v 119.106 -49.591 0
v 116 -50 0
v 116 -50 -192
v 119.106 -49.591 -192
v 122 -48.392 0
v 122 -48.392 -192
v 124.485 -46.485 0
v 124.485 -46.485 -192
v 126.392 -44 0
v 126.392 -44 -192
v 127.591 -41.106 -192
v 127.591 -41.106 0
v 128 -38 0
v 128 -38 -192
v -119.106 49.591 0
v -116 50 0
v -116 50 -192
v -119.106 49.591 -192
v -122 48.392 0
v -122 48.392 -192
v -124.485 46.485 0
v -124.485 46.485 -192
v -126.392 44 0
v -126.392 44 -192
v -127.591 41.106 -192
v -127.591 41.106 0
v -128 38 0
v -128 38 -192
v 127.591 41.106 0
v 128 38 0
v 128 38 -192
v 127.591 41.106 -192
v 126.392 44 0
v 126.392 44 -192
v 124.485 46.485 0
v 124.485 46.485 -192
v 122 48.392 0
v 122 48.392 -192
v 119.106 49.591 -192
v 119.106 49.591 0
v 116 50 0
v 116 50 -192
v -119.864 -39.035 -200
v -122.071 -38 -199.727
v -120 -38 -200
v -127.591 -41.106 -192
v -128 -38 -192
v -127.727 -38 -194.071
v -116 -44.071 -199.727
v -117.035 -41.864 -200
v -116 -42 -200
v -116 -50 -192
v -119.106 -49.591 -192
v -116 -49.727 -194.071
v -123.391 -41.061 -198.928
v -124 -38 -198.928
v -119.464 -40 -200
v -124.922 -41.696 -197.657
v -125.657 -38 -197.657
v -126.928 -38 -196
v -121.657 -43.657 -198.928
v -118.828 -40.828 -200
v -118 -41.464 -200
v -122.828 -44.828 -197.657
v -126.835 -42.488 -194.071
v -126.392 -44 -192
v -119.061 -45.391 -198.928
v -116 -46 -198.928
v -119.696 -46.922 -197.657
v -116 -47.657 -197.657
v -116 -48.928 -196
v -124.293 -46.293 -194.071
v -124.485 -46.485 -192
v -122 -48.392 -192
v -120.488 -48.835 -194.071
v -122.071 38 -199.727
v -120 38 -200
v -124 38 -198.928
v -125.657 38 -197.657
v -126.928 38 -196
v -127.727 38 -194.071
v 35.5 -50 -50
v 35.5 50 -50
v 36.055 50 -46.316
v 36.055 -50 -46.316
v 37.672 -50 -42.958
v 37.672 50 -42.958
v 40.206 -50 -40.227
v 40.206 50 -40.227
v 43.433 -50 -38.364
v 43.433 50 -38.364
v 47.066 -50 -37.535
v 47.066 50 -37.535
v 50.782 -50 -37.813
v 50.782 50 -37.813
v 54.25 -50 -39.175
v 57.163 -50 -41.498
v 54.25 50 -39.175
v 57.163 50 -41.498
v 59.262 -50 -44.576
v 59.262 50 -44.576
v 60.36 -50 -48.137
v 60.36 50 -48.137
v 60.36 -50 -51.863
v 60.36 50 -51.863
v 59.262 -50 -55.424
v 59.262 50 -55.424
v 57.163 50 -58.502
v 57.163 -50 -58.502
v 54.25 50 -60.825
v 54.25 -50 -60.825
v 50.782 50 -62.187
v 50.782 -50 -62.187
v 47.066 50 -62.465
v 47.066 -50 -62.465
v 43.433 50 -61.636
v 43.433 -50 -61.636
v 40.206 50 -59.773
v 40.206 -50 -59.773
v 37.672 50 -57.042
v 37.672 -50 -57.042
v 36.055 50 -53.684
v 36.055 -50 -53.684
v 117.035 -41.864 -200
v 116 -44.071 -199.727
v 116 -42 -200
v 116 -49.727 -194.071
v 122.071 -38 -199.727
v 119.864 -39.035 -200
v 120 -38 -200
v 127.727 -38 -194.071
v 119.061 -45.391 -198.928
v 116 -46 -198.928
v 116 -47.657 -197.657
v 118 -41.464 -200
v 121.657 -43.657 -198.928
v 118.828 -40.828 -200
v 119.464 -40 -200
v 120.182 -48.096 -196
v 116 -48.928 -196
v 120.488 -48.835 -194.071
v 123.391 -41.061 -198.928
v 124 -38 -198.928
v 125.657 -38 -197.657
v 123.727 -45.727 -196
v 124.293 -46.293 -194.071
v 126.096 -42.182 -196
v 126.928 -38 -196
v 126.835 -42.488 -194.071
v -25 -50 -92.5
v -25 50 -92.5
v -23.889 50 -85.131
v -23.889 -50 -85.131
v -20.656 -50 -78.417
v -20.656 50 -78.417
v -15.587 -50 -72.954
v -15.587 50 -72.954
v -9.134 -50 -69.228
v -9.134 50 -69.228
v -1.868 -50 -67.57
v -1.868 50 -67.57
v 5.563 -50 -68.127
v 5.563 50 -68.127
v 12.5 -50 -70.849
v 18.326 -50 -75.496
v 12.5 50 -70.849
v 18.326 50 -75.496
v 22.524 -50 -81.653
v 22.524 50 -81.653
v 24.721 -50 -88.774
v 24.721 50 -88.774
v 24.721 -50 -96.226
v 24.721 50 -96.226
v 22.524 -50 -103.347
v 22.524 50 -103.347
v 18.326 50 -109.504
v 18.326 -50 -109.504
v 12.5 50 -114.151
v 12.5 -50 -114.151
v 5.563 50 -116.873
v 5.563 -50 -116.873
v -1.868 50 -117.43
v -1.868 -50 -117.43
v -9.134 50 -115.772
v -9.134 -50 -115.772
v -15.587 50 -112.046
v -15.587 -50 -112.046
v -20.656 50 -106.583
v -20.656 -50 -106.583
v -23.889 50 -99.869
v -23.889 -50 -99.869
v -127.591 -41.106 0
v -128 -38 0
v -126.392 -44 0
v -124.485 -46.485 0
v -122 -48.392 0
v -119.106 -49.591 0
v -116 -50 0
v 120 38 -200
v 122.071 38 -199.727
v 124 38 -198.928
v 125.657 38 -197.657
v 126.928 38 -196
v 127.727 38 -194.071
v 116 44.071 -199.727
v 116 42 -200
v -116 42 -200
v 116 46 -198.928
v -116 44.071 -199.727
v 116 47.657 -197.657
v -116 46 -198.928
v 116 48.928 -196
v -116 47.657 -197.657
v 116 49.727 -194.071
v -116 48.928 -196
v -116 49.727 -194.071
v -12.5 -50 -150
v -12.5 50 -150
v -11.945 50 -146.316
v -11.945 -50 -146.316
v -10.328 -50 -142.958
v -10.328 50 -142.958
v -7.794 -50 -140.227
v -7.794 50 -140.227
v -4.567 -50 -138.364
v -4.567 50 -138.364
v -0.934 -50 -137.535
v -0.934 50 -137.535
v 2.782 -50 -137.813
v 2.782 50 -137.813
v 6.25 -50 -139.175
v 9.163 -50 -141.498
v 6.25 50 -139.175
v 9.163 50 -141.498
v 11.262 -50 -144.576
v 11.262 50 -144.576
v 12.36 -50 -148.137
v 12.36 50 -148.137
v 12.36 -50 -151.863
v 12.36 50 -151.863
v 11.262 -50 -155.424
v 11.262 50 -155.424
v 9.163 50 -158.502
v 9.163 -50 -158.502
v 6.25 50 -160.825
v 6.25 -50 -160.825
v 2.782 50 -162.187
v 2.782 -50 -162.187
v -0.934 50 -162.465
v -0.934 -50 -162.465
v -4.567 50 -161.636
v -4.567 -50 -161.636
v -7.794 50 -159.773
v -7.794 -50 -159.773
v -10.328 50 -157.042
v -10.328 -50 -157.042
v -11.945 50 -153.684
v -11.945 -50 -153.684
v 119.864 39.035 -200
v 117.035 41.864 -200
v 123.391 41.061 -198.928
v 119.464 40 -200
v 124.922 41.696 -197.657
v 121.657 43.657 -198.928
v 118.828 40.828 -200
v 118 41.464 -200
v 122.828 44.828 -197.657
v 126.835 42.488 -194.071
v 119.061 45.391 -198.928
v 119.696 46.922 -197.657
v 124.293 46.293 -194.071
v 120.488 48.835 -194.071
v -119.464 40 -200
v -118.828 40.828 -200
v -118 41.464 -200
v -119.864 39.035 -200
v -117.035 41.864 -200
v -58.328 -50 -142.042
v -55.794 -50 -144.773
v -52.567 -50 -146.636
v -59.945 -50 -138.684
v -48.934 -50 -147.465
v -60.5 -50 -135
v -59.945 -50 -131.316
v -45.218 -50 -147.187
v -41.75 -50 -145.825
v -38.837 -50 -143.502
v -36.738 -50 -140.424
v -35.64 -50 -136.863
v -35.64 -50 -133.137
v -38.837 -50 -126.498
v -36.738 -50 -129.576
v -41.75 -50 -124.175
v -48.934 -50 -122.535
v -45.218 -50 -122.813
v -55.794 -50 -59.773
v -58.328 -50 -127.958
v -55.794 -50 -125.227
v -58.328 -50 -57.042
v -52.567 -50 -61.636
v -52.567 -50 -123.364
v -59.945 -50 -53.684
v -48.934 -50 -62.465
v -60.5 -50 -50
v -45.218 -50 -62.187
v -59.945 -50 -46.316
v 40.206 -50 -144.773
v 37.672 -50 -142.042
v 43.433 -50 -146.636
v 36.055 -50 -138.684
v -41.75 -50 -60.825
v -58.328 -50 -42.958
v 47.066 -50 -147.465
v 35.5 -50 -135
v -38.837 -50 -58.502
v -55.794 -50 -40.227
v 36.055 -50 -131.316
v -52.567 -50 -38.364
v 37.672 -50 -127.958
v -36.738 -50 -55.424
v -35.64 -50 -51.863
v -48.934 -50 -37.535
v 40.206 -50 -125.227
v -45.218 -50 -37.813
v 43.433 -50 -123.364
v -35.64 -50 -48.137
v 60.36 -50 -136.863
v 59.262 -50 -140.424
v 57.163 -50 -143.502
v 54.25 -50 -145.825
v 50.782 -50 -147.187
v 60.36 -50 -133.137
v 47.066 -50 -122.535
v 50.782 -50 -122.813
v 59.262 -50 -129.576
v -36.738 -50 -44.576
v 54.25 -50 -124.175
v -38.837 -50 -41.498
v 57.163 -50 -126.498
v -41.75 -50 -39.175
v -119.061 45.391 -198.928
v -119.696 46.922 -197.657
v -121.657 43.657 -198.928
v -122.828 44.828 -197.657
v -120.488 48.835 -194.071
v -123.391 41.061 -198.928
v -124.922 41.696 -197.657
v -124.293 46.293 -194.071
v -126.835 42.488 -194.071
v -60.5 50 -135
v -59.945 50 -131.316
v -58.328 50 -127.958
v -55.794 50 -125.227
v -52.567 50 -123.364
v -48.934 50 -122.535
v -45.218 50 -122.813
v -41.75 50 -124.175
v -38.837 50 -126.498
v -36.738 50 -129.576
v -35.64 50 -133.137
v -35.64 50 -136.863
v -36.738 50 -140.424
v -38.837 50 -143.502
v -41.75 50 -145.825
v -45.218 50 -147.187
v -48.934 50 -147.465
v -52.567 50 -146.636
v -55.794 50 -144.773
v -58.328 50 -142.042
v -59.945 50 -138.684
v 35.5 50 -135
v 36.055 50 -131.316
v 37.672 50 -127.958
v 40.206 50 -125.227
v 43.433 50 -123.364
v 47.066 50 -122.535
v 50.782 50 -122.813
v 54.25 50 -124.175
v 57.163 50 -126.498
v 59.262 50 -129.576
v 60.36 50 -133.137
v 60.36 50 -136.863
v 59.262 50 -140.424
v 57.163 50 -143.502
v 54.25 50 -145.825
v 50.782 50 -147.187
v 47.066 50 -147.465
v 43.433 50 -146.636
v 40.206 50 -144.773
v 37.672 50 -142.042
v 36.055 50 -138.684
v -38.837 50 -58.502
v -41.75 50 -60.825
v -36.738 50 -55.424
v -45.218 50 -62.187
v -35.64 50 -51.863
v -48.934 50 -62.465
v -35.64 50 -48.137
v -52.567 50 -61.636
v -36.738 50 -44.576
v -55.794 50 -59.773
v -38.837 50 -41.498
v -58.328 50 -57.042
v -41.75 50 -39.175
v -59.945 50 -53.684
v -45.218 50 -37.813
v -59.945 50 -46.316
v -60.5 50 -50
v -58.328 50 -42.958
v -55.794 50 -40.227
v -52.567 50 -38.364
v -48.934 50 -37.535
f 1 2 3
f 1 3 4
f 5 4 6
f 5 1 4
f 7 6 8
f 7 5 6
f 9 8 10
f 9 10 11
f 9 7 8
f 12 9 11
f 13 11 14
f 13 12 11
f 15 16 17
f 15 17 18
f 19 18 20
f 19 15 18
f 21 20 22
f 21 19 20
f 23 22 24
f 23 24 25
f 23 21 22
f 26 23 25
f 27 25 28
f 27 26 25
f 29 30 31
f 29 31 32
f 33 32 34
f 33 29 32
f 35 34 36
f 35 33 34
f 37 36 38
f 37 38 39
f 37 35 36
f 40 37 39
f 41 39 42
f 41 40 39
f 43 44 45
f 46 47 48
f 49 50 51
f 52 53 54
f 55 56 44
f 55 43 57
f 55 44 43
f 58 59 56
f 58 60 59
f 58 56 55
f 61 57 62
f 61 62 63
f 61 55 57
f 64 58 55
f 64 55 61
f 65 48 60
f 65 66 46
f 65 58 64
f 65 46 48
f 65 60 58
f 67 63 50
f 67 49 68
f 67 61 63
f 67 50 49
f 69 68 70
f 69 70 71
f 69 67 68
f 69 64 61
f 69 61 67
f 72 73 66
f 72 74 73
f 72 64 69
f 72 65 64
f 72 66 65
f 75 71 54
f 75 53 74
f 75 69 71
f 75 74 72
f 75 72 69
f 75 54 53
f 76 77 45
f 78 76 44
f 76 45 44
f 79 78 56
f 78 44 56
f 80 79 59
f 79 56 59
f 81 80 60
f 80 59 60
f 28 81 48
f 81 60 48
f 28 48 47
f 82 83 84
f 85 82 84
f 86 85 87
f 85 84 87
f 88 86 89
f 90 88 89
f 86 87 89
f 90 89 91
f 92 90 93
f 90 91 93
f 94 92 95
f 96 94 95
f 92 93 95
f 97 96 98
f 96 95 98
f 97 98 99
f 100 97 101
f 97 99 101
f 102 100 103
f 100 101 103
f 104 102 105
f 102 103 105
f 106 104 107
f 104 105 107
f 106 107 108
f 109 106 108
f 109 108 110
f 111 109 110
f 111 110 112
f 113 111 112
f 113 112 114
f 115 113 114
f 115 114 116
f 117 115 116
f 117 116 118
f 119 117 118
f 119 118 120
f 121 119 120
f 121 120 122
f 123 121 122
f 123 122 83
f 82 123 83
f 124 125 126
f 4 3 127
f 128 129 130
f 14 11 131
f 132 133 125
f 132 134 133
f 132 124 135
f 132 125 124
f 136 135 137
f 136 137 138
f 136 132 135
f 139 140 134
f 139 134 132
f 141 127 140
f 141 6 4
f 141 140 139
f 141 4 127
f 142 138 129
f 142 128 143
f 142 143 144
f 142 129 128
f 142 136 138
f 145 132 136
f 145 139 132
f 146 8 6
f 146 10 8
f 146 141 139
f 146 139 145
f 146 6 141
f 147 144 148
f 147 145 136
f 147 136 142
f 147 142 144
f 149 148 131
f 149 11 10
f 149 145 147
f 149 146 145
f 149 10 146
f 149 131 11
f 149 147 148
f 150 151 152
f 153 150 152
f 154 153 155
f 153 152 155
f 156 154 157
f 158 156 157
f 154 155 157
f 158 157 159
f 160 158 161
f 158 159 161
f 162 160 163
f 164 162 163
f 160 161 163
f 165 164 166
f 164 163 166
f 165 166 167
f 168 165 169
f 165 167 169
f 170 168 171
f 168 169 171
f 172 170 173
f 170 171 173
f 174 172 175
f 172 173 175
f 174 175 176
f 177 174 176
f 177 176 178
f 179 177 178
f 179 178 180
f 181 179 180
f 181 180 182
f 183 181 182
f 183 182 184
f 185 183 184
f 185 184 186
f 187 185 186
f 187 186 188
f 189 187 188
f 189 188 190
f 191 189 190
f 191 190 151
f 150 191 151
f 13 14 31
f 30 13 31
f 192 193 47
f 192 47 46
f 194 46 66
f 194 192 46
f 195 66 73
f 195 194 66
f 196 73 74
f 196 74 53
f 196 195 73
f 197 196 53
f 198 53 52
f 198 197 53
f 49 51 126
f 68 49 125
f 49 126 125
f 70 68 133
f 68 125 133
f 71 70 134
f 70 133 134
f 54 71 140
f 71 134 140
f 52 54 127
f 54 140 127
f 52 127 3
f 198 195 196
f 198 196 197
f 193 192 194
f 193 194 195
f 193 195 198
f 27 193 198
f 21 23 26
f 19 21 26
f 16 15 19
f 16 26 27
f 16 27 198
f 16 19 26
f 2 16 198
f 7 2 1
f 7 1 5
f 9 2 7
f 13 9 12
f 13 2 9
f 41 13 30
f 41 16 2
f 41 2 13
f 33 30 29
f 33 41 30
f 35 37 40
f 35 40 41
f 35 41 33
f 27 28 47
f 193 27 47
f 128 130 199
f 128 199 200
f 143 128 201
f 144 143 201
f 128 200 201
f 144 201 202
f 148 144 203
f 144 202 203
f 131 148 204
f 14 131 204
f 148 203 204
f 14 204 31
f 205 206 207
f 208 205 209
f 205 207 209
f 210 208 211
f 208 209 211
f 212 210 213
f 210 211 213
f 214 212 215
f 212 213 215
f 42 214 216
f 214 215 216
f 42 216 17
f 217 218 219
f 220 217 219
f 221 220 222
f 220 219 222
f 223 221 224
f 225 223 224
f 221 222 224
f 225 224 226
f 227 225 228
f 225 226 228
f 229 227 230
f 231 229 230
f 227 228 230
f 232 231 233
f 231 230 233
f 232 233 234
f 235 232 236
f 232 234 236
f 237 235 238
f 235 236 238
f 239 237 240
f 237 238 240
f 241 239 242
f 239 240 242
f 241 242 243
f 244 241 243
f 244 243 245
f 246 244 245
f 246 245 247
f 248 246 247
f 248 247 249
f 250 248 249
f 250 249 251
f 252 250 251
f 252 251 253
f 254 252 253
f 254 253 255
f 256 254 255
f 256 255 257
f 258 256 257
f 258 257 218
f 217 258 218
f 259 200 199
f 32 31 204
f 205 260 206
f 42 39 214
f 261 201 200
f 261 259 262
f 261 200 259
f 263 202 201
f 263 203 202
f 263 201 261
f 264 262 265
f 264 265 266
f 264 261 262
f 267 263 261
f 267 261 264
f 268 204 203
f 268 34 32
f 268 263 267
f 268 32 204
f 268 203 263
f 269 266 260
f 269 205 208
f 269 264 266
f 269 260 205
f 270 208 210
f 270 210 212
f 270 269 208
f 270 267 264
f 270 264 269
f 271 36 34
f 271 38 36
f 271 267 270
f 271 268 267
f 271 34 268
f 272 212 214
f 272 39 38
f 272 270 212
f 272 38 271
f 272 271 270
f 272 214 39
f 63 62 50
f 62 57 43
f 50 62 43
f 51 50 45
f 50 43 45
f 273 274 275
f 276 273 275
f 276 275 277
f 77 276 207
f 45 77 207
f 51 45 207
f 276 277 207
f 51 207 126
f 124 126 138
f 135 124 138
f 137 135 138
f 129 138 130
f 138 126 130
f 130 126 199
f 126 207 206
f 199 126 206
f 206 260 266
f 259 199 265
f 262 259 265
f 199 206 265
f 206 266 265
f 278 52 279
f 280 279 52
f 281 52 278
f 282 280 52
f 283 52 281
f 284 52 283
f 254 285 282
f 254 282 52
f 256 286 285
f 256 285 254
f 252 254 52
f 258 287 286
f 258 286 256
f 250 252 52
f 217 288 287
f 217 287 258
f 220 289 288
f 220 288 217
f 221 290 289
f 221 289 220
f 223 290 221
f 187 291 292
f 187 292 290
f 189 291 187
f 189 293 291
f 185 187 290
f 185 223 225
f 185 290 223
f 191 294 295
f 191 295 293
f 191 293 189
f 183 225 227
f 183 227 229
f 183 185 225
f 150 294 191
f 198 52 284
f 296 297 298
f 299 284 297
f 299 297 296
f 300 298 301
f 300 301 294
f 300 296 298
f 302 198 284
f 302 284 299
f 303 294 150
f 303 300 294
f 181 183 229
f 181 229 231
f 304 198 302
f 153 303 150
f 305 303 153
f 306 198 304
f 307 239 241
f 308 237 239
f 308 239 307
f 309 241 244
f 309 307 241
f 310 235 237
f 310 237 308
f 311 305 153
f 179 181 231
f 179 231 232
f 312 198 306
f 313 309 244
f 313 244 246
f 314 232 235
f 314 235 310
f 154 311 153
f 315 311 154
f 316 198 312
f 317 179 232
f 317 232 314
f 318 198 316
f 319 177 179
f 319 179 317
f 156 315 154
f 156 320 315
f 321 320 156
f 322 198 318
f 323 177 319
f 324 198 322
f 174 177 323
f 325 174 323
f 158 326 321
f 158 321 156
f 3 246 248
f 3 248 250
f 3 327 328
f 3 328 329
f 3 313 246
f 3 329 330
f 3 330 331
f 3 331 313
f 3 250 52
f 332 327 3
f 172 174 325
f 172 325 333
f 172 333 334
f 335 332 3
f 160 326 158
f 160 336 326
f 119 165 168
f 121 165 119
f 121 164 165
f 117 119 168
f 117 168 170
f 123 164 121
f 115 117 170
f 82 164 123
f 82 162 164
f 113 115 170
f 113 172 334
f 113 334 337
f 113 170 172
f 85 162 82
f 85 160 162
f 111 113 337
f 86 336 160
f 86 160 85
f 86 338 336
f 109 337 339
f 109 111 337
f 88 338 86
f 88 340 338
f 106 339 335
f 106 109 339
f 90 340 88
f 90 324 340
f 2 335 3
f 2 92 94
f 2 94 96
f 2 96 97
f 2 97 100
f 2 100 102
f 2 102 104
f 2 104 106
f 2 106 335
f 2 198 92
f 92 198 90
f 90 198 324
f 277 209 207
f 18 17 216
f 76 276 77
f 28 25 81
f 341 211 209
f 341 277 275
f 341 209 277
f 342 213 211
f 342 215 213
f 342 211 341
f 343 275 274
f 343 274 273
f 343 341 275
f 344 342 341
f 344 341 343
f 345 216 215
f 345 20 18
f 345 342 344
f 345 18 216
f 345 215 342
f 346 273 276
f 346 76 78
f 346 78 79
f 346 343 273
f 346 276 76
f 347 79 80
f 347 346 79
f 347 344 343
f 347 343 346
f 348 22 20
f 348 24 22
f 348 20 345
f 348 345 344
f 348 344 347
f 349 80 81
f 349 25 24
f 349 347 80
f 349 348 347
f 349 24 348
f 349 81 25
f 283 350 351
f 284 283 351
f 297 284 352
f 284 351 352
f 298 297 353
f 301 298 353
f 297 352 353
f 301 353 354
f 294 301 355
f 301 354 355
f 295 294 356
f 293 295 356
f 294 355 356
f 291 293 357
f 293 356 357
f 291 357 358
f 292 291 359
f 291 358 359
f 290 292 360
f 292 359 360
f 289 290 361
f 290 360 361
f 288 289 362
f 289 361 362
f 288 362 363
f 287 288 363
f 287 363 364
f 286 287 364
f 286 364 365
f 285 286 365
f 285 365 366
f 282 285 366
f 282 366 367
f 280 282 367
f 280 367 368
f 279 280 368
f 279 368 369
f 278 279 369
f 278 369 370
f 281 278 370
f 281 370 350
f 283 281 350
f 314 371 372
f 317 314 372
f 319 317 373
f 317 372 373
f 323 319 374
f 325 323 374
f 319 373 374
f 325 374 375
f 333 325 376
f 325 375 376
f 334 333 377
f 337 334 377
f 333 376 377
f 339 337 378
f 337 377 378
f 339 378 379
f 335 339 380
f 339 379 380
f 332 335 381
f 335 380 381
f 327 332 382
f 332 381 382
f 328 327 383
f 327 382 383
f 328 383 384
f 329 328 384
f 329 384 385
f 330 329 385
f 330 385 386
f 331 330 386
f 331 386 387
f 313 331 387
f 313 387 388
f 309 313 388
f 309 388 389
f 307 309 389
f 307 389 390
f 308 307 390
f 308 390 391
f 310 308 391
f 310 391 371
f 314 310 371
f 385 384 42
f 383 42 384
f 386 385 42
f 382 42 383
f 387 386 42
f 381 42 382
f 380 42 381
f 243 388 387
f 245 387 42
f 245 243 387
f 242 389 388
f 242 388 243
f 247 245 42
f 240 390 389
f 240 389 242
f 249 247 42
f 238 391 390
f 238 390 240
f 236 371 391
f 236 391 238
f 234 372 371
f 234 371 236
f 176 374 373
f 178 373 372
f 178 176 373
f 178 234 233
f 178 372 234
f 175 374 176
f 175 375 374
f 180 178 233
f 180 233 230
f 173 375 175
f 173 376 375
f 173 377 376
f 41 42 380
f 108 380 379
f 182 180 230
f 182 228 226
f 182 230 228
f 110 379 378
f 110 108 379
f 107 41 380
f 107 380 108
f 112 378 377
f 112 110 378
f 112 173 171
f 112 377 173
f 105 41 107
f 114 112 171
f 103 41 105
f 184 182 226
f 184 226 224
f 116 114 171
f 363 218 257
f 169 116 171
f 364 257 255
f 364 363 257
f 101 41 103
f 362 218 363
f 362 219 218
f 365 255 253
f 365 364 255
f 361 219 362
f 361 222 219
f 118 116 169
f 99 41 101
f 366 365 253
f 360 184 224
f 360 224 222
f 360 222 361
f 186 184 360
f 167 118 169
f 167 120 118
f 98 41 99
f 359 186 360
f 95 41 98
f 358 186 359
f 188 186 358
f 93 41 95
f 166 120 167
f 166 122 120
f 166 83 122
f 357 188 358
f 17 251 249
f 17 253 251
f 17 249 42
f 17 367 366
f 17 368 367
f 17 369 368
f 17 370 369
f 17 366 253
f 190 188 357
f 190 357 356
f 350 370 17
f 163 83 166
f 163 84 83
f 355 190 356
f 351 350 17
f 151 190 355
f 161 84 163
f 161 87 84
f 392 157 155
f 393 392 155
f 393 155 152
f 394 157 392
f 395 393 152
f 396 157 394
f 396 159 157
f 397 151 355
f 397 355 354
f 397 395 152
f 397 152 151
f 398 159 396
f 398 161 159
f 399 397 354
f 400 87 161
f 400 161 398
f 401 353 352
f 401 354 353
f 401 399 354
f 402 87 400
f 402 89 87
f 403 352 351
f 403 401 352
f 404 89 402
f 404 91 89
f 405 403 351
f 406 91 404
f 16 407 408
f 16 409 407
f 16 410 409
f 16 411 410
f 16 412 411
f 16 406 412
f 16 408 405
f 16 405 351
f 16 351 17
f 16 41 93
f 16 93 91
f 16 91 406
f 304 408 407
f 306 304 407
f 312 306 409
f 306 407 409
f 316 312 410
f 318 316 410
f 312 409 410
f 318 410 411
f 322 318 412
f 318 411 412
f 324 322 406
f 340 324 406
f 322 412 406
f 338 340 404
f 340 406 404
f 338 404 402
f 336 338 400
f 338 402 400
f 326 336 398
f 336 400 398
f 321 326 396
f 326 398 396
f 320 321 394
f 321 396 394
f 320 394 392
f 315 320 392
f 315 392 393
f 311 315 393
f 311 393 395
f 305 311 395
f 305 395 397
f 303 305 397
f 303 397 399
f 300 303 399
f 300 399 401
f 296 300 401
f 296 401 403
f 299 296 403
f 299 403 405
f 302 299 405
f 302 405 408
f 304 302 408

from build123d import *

# Parameters (mm, degrees)
F1_DEPTH = 200
F3_D     = 25
F4_R     = 8
F5_D     = 50


with BuildPart() as f1:
    # F0 (on Top) → F1 (new body)
    with BuildSketch(Plane.XY):
        with BuildLine():
            Line((116, 50), (-116, 50))
            ThreePointArc((-116, 50), (-124.485281, 46.485281), (-128, 38))
            Line((-128, 38), (-128, -38))
            ThreePointArc((-128, -38), (-124.485281, -46.485281), (-116, -50))
            Line((-116, -50), (116, -50))
            ThreePointArc((116, -50), (124.485281, -46.485281), (128, -38))
            Line((128, -38), (128, 38))
            ThreePointArc((128, 38), (124.485281, 46.485281), (116, 50))
        make_face()
    extrude(amount=-F1_DEPTH)

    # F3 (through all)
    with Locations(Plane.XZ.offset(50)):
        with Locations((-48, -50), (48, -50), (48, -135), (0, -150), (-48, -135)):
            Hole(F3_D / 2)

    # F4
    f4_edges = [f1.edges().sort_by_distance(p)[0] for p in [
        (128, 0, -200),
    ]]
    fillet(f4_edges, radius=F4_R)

    # F5 (through all)
    with Locations(Plane.XZ.offset(50)):
        with Locations((0, -92.5)):
            Hole(F5_D / 2)


solid = f1.part
